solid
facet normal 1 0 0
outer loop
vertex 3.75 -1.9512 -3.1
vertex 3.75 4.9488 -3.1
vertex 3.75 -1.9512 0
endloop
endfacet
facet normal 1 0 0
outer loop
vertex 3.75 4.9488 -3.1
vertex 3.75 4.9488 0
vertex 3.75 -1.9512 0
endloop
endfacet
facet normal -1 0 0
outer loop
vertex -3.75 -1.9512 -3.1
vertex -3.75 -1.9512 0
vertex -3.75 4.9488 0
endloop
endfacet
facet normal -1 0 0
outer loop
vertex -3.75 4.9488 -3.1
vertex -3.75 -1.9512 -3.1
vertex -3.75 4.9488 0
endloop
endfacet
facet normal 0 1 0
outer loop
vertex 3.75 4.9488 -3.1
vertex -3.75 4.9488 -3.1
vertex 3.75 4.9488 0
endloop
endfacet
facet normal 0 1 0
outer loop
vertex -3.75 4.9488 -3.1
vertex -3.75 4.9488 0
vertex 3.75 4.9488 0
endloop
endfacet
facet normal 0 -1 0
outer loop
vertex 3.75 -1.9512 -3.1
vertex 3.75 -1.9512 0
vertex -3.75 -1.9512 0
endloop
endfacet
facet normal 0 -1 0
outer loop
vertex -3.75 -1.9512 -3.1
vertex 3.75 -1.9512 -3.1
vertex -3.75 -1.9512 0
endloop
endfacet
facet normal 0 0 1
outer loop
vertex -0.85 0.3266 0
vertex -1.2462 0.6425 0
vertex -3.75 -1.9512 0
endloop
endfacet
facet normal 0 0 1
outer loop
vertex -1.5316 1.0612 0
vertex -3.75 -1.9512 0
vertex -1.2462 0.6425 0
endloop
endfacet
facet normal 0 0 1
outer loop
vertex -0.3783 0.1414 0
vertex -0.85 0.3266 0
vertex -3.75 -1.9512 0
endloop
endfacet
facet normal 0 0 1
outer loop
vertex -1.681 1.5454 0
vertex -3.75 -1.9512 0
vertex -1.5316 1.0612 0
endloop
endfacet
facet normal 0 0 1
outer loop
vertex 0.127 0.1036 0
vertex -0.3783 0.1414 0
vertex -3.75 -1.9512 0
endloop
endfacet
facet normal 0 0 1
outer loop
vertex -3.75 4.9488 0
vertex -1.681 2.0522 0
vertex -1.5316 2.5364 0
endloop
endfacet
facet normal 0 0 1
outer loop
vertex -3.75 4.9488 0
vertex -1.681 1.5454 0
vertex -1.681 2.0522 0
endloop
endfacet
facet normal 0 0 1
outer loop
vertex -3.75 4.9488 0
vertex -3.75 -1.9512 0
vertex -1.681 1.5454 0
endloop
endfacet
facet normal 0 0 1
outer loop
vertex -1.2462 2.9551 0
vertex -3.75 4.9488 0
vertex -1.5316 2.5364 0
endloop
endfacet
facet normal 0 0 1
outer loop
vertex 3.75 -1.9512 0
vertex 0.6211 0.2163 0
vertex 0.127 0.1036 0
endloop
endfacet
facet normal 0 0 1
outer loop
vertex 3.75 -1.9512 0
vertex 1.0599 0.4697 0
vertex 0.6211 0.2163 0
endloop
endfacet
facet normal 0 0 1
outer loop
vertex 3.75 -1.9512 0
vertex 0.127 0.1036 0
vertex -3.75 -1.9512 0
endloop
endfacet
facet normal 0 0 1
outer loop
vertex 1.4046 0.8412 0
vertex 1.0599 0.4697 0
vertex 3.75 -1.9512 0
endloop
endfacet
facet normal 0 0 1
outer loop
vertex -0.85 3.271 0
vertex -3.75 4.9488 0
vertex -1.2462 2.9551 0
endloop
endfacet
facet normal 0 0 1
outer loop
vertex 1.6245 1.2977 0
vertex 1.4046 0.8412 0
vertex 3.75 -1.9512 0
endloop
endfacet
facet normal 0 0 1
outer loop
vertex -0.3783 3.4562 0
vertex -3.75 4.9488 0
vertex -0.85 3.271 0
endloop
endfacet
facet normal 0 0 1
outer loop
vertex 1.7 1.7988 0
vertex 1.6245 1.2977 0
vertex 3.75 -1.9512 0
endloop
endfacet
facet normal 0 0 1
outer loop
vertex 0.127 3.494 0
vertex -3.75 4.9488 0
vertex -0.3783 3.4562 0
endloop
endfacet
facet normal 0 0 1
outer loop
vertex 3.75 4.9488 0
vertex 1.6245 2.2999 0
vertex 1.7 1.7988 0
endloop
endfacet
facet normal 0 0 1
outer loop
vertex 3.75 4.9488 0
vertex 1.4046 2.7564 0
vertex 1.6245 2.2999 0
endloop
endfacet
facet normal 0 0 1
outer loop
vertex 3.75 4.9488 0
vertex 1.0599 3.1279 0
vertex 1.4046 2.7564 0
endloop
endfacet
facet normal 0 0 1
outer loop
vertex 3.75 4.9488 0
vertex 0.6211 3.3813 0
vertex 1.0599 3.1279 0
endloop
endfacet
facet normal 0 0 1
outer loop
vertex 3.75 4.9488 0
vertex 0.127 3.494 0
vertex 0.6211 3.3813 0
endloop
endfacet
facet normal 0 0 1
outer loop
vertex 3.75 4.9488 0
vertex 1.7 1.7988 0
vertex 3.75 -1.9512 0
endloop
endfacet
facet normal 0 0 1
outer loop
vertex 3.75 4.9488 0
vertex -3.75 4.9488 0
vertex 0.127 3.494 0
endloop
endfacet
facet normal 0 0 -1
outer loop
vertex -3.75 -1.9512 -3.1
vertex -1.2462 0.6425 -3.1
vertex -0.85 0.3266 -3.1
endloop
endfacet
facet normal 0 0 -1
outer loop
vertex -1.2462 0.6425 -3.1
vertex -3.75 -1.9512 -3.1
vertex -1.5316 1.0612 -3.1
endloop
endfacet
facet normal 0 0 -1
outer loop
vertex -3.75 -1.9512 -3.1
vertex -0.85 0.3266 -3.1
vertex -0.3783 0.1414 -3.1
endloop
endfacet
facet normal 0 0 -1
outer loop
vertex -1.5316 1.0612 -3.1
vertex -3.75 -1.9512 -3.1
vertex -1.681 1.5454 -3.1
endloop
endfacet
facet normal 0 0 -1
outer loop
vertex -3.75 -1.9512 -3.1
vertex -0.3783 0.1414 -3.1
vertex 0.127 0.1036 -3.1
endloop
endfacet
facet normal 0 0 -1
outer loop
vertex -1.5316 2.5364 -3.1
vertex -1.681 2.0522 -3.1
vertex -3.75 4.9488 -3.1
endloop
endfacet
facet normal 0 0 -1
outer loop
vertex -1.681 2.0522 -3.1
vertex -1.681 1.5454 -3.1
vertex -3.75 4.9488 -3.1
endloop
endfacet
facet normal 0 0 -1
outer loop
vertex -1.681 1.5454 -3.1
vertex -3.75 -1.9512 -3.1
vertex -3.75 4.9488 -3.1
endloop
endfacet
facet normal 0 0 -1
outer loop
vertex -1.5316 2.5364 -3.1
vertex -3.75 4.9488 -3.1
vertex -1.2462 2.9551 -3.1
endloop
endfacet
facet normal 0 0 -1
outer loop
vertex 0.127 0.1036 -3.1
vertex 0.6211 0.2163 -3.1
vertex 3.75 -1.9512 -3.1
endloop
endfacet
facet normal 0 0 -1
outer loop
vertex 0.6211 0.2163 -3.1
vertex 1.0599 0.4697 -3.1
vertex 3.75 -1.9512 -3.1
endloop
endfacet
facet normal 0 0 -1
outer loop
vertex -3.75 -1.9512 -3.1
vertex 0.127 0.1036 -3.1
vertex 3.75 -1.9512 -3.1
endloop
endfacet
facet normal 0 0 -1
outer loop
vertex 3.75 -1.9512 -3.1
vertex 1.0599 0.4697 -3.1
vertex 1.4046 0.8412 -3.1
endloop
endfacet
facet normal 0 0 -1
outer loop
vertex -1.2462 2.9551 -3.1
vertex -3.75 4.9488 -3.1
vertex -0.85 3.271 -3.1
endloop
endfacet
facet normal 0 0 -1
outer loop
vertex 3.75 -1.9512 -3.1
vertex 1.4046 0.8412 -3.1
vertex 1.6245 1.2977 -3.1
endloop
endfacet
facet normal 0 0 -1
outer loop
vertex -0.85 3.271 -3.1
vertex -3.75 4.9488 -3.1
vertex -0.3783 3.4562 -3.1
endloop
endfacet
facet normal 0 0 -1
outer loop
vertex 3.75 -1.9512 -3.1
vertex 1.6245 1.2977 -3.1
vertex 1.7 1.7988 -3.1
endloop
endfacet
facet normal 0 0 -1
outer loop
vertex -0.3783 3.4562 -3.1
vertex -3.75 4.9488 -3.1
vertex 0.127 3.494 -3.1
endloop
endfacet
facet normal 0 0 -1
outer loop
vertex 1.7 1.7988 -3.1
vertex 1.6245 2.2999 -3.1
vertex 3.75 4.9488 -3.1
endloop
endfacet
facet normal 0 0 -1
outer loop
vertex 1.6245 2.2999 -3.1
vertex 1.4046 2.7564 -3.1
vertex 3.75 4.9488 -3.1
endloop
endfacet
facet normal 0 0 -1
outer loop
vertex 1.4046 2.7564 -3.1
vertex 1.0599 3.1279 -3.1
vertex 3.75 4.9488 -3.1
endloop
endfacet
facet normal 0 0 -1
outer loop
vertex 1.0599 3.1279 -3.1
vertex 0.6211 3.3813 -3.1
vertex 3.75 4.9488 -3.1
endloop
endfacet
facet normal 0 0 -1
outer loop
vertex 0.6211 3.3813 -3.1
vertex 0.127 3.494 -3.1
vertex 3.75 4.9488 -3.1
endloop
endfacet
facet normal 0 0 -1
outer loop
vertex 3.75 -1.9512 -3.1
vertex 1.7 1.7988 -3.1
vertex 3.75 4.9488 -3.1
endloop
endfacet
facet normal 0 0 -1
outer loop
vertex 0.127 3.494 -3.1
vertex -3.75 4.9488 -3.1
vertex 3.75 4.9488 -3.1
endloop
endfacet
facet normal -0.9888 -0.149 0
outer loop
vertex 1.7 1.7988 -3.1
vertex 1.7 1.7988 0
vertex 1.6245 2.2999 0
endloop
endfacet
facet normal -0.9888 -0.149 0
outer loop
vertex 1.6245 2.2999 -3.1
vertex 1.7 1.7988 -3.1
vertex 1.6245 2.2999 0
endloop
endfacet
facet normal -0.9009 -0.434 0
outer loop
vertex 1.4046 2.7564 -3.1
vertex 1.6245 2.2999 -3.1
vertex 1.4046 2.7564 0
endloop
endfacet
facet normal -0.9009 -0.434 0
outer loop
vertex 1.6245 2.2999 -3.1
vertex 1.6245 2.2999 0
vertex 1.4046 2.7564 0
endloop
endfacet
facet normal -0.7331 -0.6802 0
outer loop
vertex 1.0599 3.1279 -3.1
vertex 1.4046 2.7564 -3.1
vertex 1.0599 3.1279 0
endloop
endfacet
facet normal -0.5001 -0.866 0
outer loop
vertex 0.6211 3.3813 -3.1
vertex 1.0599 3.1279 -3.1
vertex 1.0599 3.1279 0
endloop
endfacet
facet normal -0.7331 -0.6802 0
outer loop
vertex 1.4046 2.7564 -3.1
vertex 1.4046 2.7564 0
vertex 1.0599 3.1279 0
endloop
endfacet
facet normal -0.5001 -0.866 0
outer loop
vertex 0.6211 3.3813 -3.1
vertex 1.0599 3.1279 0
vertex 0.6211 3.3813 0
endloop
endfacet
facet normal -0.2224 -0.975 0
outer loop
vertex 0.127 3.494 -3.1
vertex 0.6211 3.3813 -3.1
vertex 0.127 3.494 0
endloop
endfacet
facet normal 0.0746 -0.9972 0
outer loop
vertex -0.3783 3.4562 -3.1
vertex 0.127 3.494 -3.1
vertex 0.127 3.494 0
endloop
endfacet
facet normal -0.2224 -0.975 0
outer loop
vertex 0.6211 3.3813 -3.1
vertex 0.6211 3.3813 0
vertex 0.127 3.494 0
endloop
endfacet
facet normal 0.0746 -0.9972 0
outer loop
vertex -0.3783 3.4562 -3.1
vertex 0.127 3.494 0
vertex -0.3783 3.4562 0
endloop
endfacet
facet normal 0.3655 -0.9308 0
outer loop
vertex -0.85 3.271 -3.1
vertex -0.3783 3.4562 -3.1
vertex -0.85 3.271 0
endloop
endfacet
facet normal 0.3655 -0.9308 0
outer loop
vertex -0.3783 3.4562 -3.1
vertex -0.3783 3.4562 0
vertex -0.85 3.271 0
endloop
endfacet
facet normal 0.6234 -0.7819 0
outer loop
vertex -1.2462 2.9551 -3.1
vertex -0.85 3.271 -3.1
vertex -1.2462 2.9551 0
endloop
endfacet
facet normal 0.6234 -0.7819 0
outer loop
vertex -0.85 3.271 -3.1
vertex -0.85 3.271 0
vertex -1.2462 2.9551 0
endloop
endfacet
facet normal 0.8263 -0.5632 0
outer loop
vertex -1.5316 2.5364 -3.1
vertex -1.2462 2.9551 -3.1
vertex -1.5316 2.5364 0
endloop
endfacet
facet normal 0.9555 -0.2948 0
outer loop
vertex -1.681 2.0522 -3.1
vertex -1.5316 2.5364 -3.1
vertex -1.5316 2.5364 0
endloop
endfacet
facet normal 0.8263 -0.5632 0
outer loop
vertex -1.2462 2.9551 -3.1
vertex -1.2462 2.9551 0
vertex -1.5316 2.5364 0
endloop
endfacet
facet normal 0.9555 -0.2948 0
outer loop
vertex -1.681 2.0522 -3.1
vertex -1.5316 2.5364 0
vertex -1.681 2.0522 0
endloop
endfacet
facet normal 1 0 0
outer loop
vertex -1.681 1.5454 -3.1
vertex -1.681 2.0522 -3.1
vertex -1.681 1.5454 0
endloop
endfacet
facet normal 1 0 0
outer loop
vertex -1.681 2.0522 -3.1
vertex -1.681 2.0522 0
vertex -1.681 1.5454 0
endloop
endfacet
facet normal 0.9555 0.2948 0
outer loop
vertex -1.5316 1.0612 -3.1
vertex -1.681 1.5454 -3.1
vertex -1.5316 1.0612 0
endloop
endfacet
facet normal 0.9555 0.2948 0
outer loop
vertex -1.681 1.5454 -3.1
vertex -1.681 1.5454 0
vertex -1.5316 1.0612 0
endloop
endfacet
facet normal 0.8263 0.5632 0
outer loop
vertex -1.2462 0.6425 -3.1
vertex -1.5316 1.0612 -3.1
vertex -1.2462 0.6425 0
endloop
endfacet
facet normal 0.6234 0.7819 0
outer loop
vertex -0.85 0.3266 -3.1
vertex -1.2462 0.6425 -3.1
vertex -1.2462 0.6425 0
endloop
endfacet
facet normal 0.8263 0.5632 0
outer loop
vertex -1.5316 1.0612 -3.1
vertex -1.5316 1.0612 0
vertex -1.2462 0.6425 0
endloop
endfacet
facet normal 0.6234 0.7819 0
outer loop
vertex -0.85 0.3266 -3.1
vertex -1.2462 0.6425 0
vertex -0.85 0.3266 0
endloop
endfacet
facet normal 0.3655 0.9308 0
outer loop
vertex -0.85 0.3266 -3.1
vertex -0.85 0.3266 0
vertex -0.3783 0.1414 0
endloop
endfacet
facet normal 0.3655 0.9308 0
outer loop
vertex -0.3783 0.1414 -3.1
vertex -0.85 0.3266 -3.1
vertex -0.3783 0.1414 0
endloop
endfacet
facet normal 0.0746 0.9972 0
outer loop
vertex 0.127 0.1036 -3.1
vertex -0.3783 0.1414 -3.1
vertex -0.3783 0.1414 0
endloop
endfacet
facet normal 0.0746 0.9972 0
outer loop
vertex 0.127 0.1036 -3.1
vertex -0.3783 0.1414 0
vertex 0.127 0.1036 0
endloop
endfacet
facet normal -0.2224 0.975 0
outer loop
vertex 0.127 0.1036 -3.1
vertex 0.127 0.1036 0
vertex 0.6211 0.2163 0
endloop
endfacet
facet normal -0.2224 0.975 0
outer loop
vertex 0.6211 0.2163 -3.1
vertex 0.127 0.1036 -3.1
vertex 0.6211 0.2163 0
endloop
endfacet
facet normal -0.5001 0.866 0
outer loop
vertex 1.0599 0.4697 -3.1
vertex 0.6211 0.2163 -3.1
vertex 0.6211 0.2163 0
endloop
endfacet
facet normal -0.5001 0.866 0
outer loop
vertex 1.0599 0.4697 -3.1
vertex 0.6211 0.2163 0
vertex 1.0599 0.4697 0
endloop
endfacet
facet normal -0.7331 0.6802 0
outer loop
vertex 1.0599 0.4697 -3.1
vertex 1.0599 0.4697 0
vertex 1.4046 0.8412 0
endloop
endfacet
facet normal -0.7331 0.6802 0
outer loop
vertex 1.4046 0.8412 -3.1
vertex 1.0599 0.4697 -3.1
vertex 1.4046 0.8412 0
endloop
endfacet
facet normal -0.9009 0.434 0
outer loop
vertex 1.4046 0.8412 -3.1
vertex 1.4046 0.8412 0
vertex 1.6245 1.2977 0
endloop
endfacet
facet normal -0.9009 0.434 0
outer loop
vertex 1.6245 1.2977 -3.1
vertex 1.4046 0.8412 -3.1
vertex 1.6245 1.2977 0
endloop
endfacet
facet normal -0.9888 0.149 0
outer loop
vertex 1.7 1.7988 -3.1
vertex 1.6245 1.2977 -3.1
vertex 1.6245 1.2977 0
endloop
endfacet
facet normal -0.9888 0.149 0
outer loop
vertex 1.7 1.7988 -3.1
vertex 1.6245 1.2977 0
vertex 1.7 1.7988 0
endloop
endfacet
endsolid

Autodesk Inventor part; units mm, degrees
ref_plane "YZ Plane" through (0, 0, 0) normal (1, 0, 0) x (0, 1, 0)
ref_plane "XZ Plane" through (0, 0, 0) normal (0, 1, 0) x (-1, 0, 0)
ref_plane "XY Plane" through (0, 0, 0) normal (0, 0, 1) x (1, 0, 0)
sketch "Skizze1" plane through (0, 0, 0) normal (0, 0, 1) x (1, 0, 0)
  line L0 (3.75, 4.9488) -> (3.75, -1.9512) projected
  line L1 (-3.75, -1.9512) -> (-3.75, 4.9488) projected
  line L2 (3.75, -1.9512) -> (-3.75, -1.9512) projected
  line L3 (0, 0) -> (3.75, 0) construction
  line L4 (0, 1.7988) -> (0, -1.9512) construction
  line L5 (-3.75, 4.9488) -> (3.75, 4.9488)
  line L6 (3.75, 4.9488) -> (3.75, -1.9512)
  line L7 (3.75, -1.9512) -> (-3.75, -1.9512)
  line L8 (-3.75, -1.9512) -> (-3.75, 4.9488)
  circle A0 centre (0, 1.7988) radius 1.7
  dimension "d0" = 3.75
  dimension "d2" = 3.75
  dimension "d5" = 3.4
extrude "Extrusion2" add sketch "Skizze1" against normal blind 3.1
thread "Gewinde1" size "M4x0.7" class "6H" standard "ANSI Metric M Profile" full length
properties part number "mutter"
